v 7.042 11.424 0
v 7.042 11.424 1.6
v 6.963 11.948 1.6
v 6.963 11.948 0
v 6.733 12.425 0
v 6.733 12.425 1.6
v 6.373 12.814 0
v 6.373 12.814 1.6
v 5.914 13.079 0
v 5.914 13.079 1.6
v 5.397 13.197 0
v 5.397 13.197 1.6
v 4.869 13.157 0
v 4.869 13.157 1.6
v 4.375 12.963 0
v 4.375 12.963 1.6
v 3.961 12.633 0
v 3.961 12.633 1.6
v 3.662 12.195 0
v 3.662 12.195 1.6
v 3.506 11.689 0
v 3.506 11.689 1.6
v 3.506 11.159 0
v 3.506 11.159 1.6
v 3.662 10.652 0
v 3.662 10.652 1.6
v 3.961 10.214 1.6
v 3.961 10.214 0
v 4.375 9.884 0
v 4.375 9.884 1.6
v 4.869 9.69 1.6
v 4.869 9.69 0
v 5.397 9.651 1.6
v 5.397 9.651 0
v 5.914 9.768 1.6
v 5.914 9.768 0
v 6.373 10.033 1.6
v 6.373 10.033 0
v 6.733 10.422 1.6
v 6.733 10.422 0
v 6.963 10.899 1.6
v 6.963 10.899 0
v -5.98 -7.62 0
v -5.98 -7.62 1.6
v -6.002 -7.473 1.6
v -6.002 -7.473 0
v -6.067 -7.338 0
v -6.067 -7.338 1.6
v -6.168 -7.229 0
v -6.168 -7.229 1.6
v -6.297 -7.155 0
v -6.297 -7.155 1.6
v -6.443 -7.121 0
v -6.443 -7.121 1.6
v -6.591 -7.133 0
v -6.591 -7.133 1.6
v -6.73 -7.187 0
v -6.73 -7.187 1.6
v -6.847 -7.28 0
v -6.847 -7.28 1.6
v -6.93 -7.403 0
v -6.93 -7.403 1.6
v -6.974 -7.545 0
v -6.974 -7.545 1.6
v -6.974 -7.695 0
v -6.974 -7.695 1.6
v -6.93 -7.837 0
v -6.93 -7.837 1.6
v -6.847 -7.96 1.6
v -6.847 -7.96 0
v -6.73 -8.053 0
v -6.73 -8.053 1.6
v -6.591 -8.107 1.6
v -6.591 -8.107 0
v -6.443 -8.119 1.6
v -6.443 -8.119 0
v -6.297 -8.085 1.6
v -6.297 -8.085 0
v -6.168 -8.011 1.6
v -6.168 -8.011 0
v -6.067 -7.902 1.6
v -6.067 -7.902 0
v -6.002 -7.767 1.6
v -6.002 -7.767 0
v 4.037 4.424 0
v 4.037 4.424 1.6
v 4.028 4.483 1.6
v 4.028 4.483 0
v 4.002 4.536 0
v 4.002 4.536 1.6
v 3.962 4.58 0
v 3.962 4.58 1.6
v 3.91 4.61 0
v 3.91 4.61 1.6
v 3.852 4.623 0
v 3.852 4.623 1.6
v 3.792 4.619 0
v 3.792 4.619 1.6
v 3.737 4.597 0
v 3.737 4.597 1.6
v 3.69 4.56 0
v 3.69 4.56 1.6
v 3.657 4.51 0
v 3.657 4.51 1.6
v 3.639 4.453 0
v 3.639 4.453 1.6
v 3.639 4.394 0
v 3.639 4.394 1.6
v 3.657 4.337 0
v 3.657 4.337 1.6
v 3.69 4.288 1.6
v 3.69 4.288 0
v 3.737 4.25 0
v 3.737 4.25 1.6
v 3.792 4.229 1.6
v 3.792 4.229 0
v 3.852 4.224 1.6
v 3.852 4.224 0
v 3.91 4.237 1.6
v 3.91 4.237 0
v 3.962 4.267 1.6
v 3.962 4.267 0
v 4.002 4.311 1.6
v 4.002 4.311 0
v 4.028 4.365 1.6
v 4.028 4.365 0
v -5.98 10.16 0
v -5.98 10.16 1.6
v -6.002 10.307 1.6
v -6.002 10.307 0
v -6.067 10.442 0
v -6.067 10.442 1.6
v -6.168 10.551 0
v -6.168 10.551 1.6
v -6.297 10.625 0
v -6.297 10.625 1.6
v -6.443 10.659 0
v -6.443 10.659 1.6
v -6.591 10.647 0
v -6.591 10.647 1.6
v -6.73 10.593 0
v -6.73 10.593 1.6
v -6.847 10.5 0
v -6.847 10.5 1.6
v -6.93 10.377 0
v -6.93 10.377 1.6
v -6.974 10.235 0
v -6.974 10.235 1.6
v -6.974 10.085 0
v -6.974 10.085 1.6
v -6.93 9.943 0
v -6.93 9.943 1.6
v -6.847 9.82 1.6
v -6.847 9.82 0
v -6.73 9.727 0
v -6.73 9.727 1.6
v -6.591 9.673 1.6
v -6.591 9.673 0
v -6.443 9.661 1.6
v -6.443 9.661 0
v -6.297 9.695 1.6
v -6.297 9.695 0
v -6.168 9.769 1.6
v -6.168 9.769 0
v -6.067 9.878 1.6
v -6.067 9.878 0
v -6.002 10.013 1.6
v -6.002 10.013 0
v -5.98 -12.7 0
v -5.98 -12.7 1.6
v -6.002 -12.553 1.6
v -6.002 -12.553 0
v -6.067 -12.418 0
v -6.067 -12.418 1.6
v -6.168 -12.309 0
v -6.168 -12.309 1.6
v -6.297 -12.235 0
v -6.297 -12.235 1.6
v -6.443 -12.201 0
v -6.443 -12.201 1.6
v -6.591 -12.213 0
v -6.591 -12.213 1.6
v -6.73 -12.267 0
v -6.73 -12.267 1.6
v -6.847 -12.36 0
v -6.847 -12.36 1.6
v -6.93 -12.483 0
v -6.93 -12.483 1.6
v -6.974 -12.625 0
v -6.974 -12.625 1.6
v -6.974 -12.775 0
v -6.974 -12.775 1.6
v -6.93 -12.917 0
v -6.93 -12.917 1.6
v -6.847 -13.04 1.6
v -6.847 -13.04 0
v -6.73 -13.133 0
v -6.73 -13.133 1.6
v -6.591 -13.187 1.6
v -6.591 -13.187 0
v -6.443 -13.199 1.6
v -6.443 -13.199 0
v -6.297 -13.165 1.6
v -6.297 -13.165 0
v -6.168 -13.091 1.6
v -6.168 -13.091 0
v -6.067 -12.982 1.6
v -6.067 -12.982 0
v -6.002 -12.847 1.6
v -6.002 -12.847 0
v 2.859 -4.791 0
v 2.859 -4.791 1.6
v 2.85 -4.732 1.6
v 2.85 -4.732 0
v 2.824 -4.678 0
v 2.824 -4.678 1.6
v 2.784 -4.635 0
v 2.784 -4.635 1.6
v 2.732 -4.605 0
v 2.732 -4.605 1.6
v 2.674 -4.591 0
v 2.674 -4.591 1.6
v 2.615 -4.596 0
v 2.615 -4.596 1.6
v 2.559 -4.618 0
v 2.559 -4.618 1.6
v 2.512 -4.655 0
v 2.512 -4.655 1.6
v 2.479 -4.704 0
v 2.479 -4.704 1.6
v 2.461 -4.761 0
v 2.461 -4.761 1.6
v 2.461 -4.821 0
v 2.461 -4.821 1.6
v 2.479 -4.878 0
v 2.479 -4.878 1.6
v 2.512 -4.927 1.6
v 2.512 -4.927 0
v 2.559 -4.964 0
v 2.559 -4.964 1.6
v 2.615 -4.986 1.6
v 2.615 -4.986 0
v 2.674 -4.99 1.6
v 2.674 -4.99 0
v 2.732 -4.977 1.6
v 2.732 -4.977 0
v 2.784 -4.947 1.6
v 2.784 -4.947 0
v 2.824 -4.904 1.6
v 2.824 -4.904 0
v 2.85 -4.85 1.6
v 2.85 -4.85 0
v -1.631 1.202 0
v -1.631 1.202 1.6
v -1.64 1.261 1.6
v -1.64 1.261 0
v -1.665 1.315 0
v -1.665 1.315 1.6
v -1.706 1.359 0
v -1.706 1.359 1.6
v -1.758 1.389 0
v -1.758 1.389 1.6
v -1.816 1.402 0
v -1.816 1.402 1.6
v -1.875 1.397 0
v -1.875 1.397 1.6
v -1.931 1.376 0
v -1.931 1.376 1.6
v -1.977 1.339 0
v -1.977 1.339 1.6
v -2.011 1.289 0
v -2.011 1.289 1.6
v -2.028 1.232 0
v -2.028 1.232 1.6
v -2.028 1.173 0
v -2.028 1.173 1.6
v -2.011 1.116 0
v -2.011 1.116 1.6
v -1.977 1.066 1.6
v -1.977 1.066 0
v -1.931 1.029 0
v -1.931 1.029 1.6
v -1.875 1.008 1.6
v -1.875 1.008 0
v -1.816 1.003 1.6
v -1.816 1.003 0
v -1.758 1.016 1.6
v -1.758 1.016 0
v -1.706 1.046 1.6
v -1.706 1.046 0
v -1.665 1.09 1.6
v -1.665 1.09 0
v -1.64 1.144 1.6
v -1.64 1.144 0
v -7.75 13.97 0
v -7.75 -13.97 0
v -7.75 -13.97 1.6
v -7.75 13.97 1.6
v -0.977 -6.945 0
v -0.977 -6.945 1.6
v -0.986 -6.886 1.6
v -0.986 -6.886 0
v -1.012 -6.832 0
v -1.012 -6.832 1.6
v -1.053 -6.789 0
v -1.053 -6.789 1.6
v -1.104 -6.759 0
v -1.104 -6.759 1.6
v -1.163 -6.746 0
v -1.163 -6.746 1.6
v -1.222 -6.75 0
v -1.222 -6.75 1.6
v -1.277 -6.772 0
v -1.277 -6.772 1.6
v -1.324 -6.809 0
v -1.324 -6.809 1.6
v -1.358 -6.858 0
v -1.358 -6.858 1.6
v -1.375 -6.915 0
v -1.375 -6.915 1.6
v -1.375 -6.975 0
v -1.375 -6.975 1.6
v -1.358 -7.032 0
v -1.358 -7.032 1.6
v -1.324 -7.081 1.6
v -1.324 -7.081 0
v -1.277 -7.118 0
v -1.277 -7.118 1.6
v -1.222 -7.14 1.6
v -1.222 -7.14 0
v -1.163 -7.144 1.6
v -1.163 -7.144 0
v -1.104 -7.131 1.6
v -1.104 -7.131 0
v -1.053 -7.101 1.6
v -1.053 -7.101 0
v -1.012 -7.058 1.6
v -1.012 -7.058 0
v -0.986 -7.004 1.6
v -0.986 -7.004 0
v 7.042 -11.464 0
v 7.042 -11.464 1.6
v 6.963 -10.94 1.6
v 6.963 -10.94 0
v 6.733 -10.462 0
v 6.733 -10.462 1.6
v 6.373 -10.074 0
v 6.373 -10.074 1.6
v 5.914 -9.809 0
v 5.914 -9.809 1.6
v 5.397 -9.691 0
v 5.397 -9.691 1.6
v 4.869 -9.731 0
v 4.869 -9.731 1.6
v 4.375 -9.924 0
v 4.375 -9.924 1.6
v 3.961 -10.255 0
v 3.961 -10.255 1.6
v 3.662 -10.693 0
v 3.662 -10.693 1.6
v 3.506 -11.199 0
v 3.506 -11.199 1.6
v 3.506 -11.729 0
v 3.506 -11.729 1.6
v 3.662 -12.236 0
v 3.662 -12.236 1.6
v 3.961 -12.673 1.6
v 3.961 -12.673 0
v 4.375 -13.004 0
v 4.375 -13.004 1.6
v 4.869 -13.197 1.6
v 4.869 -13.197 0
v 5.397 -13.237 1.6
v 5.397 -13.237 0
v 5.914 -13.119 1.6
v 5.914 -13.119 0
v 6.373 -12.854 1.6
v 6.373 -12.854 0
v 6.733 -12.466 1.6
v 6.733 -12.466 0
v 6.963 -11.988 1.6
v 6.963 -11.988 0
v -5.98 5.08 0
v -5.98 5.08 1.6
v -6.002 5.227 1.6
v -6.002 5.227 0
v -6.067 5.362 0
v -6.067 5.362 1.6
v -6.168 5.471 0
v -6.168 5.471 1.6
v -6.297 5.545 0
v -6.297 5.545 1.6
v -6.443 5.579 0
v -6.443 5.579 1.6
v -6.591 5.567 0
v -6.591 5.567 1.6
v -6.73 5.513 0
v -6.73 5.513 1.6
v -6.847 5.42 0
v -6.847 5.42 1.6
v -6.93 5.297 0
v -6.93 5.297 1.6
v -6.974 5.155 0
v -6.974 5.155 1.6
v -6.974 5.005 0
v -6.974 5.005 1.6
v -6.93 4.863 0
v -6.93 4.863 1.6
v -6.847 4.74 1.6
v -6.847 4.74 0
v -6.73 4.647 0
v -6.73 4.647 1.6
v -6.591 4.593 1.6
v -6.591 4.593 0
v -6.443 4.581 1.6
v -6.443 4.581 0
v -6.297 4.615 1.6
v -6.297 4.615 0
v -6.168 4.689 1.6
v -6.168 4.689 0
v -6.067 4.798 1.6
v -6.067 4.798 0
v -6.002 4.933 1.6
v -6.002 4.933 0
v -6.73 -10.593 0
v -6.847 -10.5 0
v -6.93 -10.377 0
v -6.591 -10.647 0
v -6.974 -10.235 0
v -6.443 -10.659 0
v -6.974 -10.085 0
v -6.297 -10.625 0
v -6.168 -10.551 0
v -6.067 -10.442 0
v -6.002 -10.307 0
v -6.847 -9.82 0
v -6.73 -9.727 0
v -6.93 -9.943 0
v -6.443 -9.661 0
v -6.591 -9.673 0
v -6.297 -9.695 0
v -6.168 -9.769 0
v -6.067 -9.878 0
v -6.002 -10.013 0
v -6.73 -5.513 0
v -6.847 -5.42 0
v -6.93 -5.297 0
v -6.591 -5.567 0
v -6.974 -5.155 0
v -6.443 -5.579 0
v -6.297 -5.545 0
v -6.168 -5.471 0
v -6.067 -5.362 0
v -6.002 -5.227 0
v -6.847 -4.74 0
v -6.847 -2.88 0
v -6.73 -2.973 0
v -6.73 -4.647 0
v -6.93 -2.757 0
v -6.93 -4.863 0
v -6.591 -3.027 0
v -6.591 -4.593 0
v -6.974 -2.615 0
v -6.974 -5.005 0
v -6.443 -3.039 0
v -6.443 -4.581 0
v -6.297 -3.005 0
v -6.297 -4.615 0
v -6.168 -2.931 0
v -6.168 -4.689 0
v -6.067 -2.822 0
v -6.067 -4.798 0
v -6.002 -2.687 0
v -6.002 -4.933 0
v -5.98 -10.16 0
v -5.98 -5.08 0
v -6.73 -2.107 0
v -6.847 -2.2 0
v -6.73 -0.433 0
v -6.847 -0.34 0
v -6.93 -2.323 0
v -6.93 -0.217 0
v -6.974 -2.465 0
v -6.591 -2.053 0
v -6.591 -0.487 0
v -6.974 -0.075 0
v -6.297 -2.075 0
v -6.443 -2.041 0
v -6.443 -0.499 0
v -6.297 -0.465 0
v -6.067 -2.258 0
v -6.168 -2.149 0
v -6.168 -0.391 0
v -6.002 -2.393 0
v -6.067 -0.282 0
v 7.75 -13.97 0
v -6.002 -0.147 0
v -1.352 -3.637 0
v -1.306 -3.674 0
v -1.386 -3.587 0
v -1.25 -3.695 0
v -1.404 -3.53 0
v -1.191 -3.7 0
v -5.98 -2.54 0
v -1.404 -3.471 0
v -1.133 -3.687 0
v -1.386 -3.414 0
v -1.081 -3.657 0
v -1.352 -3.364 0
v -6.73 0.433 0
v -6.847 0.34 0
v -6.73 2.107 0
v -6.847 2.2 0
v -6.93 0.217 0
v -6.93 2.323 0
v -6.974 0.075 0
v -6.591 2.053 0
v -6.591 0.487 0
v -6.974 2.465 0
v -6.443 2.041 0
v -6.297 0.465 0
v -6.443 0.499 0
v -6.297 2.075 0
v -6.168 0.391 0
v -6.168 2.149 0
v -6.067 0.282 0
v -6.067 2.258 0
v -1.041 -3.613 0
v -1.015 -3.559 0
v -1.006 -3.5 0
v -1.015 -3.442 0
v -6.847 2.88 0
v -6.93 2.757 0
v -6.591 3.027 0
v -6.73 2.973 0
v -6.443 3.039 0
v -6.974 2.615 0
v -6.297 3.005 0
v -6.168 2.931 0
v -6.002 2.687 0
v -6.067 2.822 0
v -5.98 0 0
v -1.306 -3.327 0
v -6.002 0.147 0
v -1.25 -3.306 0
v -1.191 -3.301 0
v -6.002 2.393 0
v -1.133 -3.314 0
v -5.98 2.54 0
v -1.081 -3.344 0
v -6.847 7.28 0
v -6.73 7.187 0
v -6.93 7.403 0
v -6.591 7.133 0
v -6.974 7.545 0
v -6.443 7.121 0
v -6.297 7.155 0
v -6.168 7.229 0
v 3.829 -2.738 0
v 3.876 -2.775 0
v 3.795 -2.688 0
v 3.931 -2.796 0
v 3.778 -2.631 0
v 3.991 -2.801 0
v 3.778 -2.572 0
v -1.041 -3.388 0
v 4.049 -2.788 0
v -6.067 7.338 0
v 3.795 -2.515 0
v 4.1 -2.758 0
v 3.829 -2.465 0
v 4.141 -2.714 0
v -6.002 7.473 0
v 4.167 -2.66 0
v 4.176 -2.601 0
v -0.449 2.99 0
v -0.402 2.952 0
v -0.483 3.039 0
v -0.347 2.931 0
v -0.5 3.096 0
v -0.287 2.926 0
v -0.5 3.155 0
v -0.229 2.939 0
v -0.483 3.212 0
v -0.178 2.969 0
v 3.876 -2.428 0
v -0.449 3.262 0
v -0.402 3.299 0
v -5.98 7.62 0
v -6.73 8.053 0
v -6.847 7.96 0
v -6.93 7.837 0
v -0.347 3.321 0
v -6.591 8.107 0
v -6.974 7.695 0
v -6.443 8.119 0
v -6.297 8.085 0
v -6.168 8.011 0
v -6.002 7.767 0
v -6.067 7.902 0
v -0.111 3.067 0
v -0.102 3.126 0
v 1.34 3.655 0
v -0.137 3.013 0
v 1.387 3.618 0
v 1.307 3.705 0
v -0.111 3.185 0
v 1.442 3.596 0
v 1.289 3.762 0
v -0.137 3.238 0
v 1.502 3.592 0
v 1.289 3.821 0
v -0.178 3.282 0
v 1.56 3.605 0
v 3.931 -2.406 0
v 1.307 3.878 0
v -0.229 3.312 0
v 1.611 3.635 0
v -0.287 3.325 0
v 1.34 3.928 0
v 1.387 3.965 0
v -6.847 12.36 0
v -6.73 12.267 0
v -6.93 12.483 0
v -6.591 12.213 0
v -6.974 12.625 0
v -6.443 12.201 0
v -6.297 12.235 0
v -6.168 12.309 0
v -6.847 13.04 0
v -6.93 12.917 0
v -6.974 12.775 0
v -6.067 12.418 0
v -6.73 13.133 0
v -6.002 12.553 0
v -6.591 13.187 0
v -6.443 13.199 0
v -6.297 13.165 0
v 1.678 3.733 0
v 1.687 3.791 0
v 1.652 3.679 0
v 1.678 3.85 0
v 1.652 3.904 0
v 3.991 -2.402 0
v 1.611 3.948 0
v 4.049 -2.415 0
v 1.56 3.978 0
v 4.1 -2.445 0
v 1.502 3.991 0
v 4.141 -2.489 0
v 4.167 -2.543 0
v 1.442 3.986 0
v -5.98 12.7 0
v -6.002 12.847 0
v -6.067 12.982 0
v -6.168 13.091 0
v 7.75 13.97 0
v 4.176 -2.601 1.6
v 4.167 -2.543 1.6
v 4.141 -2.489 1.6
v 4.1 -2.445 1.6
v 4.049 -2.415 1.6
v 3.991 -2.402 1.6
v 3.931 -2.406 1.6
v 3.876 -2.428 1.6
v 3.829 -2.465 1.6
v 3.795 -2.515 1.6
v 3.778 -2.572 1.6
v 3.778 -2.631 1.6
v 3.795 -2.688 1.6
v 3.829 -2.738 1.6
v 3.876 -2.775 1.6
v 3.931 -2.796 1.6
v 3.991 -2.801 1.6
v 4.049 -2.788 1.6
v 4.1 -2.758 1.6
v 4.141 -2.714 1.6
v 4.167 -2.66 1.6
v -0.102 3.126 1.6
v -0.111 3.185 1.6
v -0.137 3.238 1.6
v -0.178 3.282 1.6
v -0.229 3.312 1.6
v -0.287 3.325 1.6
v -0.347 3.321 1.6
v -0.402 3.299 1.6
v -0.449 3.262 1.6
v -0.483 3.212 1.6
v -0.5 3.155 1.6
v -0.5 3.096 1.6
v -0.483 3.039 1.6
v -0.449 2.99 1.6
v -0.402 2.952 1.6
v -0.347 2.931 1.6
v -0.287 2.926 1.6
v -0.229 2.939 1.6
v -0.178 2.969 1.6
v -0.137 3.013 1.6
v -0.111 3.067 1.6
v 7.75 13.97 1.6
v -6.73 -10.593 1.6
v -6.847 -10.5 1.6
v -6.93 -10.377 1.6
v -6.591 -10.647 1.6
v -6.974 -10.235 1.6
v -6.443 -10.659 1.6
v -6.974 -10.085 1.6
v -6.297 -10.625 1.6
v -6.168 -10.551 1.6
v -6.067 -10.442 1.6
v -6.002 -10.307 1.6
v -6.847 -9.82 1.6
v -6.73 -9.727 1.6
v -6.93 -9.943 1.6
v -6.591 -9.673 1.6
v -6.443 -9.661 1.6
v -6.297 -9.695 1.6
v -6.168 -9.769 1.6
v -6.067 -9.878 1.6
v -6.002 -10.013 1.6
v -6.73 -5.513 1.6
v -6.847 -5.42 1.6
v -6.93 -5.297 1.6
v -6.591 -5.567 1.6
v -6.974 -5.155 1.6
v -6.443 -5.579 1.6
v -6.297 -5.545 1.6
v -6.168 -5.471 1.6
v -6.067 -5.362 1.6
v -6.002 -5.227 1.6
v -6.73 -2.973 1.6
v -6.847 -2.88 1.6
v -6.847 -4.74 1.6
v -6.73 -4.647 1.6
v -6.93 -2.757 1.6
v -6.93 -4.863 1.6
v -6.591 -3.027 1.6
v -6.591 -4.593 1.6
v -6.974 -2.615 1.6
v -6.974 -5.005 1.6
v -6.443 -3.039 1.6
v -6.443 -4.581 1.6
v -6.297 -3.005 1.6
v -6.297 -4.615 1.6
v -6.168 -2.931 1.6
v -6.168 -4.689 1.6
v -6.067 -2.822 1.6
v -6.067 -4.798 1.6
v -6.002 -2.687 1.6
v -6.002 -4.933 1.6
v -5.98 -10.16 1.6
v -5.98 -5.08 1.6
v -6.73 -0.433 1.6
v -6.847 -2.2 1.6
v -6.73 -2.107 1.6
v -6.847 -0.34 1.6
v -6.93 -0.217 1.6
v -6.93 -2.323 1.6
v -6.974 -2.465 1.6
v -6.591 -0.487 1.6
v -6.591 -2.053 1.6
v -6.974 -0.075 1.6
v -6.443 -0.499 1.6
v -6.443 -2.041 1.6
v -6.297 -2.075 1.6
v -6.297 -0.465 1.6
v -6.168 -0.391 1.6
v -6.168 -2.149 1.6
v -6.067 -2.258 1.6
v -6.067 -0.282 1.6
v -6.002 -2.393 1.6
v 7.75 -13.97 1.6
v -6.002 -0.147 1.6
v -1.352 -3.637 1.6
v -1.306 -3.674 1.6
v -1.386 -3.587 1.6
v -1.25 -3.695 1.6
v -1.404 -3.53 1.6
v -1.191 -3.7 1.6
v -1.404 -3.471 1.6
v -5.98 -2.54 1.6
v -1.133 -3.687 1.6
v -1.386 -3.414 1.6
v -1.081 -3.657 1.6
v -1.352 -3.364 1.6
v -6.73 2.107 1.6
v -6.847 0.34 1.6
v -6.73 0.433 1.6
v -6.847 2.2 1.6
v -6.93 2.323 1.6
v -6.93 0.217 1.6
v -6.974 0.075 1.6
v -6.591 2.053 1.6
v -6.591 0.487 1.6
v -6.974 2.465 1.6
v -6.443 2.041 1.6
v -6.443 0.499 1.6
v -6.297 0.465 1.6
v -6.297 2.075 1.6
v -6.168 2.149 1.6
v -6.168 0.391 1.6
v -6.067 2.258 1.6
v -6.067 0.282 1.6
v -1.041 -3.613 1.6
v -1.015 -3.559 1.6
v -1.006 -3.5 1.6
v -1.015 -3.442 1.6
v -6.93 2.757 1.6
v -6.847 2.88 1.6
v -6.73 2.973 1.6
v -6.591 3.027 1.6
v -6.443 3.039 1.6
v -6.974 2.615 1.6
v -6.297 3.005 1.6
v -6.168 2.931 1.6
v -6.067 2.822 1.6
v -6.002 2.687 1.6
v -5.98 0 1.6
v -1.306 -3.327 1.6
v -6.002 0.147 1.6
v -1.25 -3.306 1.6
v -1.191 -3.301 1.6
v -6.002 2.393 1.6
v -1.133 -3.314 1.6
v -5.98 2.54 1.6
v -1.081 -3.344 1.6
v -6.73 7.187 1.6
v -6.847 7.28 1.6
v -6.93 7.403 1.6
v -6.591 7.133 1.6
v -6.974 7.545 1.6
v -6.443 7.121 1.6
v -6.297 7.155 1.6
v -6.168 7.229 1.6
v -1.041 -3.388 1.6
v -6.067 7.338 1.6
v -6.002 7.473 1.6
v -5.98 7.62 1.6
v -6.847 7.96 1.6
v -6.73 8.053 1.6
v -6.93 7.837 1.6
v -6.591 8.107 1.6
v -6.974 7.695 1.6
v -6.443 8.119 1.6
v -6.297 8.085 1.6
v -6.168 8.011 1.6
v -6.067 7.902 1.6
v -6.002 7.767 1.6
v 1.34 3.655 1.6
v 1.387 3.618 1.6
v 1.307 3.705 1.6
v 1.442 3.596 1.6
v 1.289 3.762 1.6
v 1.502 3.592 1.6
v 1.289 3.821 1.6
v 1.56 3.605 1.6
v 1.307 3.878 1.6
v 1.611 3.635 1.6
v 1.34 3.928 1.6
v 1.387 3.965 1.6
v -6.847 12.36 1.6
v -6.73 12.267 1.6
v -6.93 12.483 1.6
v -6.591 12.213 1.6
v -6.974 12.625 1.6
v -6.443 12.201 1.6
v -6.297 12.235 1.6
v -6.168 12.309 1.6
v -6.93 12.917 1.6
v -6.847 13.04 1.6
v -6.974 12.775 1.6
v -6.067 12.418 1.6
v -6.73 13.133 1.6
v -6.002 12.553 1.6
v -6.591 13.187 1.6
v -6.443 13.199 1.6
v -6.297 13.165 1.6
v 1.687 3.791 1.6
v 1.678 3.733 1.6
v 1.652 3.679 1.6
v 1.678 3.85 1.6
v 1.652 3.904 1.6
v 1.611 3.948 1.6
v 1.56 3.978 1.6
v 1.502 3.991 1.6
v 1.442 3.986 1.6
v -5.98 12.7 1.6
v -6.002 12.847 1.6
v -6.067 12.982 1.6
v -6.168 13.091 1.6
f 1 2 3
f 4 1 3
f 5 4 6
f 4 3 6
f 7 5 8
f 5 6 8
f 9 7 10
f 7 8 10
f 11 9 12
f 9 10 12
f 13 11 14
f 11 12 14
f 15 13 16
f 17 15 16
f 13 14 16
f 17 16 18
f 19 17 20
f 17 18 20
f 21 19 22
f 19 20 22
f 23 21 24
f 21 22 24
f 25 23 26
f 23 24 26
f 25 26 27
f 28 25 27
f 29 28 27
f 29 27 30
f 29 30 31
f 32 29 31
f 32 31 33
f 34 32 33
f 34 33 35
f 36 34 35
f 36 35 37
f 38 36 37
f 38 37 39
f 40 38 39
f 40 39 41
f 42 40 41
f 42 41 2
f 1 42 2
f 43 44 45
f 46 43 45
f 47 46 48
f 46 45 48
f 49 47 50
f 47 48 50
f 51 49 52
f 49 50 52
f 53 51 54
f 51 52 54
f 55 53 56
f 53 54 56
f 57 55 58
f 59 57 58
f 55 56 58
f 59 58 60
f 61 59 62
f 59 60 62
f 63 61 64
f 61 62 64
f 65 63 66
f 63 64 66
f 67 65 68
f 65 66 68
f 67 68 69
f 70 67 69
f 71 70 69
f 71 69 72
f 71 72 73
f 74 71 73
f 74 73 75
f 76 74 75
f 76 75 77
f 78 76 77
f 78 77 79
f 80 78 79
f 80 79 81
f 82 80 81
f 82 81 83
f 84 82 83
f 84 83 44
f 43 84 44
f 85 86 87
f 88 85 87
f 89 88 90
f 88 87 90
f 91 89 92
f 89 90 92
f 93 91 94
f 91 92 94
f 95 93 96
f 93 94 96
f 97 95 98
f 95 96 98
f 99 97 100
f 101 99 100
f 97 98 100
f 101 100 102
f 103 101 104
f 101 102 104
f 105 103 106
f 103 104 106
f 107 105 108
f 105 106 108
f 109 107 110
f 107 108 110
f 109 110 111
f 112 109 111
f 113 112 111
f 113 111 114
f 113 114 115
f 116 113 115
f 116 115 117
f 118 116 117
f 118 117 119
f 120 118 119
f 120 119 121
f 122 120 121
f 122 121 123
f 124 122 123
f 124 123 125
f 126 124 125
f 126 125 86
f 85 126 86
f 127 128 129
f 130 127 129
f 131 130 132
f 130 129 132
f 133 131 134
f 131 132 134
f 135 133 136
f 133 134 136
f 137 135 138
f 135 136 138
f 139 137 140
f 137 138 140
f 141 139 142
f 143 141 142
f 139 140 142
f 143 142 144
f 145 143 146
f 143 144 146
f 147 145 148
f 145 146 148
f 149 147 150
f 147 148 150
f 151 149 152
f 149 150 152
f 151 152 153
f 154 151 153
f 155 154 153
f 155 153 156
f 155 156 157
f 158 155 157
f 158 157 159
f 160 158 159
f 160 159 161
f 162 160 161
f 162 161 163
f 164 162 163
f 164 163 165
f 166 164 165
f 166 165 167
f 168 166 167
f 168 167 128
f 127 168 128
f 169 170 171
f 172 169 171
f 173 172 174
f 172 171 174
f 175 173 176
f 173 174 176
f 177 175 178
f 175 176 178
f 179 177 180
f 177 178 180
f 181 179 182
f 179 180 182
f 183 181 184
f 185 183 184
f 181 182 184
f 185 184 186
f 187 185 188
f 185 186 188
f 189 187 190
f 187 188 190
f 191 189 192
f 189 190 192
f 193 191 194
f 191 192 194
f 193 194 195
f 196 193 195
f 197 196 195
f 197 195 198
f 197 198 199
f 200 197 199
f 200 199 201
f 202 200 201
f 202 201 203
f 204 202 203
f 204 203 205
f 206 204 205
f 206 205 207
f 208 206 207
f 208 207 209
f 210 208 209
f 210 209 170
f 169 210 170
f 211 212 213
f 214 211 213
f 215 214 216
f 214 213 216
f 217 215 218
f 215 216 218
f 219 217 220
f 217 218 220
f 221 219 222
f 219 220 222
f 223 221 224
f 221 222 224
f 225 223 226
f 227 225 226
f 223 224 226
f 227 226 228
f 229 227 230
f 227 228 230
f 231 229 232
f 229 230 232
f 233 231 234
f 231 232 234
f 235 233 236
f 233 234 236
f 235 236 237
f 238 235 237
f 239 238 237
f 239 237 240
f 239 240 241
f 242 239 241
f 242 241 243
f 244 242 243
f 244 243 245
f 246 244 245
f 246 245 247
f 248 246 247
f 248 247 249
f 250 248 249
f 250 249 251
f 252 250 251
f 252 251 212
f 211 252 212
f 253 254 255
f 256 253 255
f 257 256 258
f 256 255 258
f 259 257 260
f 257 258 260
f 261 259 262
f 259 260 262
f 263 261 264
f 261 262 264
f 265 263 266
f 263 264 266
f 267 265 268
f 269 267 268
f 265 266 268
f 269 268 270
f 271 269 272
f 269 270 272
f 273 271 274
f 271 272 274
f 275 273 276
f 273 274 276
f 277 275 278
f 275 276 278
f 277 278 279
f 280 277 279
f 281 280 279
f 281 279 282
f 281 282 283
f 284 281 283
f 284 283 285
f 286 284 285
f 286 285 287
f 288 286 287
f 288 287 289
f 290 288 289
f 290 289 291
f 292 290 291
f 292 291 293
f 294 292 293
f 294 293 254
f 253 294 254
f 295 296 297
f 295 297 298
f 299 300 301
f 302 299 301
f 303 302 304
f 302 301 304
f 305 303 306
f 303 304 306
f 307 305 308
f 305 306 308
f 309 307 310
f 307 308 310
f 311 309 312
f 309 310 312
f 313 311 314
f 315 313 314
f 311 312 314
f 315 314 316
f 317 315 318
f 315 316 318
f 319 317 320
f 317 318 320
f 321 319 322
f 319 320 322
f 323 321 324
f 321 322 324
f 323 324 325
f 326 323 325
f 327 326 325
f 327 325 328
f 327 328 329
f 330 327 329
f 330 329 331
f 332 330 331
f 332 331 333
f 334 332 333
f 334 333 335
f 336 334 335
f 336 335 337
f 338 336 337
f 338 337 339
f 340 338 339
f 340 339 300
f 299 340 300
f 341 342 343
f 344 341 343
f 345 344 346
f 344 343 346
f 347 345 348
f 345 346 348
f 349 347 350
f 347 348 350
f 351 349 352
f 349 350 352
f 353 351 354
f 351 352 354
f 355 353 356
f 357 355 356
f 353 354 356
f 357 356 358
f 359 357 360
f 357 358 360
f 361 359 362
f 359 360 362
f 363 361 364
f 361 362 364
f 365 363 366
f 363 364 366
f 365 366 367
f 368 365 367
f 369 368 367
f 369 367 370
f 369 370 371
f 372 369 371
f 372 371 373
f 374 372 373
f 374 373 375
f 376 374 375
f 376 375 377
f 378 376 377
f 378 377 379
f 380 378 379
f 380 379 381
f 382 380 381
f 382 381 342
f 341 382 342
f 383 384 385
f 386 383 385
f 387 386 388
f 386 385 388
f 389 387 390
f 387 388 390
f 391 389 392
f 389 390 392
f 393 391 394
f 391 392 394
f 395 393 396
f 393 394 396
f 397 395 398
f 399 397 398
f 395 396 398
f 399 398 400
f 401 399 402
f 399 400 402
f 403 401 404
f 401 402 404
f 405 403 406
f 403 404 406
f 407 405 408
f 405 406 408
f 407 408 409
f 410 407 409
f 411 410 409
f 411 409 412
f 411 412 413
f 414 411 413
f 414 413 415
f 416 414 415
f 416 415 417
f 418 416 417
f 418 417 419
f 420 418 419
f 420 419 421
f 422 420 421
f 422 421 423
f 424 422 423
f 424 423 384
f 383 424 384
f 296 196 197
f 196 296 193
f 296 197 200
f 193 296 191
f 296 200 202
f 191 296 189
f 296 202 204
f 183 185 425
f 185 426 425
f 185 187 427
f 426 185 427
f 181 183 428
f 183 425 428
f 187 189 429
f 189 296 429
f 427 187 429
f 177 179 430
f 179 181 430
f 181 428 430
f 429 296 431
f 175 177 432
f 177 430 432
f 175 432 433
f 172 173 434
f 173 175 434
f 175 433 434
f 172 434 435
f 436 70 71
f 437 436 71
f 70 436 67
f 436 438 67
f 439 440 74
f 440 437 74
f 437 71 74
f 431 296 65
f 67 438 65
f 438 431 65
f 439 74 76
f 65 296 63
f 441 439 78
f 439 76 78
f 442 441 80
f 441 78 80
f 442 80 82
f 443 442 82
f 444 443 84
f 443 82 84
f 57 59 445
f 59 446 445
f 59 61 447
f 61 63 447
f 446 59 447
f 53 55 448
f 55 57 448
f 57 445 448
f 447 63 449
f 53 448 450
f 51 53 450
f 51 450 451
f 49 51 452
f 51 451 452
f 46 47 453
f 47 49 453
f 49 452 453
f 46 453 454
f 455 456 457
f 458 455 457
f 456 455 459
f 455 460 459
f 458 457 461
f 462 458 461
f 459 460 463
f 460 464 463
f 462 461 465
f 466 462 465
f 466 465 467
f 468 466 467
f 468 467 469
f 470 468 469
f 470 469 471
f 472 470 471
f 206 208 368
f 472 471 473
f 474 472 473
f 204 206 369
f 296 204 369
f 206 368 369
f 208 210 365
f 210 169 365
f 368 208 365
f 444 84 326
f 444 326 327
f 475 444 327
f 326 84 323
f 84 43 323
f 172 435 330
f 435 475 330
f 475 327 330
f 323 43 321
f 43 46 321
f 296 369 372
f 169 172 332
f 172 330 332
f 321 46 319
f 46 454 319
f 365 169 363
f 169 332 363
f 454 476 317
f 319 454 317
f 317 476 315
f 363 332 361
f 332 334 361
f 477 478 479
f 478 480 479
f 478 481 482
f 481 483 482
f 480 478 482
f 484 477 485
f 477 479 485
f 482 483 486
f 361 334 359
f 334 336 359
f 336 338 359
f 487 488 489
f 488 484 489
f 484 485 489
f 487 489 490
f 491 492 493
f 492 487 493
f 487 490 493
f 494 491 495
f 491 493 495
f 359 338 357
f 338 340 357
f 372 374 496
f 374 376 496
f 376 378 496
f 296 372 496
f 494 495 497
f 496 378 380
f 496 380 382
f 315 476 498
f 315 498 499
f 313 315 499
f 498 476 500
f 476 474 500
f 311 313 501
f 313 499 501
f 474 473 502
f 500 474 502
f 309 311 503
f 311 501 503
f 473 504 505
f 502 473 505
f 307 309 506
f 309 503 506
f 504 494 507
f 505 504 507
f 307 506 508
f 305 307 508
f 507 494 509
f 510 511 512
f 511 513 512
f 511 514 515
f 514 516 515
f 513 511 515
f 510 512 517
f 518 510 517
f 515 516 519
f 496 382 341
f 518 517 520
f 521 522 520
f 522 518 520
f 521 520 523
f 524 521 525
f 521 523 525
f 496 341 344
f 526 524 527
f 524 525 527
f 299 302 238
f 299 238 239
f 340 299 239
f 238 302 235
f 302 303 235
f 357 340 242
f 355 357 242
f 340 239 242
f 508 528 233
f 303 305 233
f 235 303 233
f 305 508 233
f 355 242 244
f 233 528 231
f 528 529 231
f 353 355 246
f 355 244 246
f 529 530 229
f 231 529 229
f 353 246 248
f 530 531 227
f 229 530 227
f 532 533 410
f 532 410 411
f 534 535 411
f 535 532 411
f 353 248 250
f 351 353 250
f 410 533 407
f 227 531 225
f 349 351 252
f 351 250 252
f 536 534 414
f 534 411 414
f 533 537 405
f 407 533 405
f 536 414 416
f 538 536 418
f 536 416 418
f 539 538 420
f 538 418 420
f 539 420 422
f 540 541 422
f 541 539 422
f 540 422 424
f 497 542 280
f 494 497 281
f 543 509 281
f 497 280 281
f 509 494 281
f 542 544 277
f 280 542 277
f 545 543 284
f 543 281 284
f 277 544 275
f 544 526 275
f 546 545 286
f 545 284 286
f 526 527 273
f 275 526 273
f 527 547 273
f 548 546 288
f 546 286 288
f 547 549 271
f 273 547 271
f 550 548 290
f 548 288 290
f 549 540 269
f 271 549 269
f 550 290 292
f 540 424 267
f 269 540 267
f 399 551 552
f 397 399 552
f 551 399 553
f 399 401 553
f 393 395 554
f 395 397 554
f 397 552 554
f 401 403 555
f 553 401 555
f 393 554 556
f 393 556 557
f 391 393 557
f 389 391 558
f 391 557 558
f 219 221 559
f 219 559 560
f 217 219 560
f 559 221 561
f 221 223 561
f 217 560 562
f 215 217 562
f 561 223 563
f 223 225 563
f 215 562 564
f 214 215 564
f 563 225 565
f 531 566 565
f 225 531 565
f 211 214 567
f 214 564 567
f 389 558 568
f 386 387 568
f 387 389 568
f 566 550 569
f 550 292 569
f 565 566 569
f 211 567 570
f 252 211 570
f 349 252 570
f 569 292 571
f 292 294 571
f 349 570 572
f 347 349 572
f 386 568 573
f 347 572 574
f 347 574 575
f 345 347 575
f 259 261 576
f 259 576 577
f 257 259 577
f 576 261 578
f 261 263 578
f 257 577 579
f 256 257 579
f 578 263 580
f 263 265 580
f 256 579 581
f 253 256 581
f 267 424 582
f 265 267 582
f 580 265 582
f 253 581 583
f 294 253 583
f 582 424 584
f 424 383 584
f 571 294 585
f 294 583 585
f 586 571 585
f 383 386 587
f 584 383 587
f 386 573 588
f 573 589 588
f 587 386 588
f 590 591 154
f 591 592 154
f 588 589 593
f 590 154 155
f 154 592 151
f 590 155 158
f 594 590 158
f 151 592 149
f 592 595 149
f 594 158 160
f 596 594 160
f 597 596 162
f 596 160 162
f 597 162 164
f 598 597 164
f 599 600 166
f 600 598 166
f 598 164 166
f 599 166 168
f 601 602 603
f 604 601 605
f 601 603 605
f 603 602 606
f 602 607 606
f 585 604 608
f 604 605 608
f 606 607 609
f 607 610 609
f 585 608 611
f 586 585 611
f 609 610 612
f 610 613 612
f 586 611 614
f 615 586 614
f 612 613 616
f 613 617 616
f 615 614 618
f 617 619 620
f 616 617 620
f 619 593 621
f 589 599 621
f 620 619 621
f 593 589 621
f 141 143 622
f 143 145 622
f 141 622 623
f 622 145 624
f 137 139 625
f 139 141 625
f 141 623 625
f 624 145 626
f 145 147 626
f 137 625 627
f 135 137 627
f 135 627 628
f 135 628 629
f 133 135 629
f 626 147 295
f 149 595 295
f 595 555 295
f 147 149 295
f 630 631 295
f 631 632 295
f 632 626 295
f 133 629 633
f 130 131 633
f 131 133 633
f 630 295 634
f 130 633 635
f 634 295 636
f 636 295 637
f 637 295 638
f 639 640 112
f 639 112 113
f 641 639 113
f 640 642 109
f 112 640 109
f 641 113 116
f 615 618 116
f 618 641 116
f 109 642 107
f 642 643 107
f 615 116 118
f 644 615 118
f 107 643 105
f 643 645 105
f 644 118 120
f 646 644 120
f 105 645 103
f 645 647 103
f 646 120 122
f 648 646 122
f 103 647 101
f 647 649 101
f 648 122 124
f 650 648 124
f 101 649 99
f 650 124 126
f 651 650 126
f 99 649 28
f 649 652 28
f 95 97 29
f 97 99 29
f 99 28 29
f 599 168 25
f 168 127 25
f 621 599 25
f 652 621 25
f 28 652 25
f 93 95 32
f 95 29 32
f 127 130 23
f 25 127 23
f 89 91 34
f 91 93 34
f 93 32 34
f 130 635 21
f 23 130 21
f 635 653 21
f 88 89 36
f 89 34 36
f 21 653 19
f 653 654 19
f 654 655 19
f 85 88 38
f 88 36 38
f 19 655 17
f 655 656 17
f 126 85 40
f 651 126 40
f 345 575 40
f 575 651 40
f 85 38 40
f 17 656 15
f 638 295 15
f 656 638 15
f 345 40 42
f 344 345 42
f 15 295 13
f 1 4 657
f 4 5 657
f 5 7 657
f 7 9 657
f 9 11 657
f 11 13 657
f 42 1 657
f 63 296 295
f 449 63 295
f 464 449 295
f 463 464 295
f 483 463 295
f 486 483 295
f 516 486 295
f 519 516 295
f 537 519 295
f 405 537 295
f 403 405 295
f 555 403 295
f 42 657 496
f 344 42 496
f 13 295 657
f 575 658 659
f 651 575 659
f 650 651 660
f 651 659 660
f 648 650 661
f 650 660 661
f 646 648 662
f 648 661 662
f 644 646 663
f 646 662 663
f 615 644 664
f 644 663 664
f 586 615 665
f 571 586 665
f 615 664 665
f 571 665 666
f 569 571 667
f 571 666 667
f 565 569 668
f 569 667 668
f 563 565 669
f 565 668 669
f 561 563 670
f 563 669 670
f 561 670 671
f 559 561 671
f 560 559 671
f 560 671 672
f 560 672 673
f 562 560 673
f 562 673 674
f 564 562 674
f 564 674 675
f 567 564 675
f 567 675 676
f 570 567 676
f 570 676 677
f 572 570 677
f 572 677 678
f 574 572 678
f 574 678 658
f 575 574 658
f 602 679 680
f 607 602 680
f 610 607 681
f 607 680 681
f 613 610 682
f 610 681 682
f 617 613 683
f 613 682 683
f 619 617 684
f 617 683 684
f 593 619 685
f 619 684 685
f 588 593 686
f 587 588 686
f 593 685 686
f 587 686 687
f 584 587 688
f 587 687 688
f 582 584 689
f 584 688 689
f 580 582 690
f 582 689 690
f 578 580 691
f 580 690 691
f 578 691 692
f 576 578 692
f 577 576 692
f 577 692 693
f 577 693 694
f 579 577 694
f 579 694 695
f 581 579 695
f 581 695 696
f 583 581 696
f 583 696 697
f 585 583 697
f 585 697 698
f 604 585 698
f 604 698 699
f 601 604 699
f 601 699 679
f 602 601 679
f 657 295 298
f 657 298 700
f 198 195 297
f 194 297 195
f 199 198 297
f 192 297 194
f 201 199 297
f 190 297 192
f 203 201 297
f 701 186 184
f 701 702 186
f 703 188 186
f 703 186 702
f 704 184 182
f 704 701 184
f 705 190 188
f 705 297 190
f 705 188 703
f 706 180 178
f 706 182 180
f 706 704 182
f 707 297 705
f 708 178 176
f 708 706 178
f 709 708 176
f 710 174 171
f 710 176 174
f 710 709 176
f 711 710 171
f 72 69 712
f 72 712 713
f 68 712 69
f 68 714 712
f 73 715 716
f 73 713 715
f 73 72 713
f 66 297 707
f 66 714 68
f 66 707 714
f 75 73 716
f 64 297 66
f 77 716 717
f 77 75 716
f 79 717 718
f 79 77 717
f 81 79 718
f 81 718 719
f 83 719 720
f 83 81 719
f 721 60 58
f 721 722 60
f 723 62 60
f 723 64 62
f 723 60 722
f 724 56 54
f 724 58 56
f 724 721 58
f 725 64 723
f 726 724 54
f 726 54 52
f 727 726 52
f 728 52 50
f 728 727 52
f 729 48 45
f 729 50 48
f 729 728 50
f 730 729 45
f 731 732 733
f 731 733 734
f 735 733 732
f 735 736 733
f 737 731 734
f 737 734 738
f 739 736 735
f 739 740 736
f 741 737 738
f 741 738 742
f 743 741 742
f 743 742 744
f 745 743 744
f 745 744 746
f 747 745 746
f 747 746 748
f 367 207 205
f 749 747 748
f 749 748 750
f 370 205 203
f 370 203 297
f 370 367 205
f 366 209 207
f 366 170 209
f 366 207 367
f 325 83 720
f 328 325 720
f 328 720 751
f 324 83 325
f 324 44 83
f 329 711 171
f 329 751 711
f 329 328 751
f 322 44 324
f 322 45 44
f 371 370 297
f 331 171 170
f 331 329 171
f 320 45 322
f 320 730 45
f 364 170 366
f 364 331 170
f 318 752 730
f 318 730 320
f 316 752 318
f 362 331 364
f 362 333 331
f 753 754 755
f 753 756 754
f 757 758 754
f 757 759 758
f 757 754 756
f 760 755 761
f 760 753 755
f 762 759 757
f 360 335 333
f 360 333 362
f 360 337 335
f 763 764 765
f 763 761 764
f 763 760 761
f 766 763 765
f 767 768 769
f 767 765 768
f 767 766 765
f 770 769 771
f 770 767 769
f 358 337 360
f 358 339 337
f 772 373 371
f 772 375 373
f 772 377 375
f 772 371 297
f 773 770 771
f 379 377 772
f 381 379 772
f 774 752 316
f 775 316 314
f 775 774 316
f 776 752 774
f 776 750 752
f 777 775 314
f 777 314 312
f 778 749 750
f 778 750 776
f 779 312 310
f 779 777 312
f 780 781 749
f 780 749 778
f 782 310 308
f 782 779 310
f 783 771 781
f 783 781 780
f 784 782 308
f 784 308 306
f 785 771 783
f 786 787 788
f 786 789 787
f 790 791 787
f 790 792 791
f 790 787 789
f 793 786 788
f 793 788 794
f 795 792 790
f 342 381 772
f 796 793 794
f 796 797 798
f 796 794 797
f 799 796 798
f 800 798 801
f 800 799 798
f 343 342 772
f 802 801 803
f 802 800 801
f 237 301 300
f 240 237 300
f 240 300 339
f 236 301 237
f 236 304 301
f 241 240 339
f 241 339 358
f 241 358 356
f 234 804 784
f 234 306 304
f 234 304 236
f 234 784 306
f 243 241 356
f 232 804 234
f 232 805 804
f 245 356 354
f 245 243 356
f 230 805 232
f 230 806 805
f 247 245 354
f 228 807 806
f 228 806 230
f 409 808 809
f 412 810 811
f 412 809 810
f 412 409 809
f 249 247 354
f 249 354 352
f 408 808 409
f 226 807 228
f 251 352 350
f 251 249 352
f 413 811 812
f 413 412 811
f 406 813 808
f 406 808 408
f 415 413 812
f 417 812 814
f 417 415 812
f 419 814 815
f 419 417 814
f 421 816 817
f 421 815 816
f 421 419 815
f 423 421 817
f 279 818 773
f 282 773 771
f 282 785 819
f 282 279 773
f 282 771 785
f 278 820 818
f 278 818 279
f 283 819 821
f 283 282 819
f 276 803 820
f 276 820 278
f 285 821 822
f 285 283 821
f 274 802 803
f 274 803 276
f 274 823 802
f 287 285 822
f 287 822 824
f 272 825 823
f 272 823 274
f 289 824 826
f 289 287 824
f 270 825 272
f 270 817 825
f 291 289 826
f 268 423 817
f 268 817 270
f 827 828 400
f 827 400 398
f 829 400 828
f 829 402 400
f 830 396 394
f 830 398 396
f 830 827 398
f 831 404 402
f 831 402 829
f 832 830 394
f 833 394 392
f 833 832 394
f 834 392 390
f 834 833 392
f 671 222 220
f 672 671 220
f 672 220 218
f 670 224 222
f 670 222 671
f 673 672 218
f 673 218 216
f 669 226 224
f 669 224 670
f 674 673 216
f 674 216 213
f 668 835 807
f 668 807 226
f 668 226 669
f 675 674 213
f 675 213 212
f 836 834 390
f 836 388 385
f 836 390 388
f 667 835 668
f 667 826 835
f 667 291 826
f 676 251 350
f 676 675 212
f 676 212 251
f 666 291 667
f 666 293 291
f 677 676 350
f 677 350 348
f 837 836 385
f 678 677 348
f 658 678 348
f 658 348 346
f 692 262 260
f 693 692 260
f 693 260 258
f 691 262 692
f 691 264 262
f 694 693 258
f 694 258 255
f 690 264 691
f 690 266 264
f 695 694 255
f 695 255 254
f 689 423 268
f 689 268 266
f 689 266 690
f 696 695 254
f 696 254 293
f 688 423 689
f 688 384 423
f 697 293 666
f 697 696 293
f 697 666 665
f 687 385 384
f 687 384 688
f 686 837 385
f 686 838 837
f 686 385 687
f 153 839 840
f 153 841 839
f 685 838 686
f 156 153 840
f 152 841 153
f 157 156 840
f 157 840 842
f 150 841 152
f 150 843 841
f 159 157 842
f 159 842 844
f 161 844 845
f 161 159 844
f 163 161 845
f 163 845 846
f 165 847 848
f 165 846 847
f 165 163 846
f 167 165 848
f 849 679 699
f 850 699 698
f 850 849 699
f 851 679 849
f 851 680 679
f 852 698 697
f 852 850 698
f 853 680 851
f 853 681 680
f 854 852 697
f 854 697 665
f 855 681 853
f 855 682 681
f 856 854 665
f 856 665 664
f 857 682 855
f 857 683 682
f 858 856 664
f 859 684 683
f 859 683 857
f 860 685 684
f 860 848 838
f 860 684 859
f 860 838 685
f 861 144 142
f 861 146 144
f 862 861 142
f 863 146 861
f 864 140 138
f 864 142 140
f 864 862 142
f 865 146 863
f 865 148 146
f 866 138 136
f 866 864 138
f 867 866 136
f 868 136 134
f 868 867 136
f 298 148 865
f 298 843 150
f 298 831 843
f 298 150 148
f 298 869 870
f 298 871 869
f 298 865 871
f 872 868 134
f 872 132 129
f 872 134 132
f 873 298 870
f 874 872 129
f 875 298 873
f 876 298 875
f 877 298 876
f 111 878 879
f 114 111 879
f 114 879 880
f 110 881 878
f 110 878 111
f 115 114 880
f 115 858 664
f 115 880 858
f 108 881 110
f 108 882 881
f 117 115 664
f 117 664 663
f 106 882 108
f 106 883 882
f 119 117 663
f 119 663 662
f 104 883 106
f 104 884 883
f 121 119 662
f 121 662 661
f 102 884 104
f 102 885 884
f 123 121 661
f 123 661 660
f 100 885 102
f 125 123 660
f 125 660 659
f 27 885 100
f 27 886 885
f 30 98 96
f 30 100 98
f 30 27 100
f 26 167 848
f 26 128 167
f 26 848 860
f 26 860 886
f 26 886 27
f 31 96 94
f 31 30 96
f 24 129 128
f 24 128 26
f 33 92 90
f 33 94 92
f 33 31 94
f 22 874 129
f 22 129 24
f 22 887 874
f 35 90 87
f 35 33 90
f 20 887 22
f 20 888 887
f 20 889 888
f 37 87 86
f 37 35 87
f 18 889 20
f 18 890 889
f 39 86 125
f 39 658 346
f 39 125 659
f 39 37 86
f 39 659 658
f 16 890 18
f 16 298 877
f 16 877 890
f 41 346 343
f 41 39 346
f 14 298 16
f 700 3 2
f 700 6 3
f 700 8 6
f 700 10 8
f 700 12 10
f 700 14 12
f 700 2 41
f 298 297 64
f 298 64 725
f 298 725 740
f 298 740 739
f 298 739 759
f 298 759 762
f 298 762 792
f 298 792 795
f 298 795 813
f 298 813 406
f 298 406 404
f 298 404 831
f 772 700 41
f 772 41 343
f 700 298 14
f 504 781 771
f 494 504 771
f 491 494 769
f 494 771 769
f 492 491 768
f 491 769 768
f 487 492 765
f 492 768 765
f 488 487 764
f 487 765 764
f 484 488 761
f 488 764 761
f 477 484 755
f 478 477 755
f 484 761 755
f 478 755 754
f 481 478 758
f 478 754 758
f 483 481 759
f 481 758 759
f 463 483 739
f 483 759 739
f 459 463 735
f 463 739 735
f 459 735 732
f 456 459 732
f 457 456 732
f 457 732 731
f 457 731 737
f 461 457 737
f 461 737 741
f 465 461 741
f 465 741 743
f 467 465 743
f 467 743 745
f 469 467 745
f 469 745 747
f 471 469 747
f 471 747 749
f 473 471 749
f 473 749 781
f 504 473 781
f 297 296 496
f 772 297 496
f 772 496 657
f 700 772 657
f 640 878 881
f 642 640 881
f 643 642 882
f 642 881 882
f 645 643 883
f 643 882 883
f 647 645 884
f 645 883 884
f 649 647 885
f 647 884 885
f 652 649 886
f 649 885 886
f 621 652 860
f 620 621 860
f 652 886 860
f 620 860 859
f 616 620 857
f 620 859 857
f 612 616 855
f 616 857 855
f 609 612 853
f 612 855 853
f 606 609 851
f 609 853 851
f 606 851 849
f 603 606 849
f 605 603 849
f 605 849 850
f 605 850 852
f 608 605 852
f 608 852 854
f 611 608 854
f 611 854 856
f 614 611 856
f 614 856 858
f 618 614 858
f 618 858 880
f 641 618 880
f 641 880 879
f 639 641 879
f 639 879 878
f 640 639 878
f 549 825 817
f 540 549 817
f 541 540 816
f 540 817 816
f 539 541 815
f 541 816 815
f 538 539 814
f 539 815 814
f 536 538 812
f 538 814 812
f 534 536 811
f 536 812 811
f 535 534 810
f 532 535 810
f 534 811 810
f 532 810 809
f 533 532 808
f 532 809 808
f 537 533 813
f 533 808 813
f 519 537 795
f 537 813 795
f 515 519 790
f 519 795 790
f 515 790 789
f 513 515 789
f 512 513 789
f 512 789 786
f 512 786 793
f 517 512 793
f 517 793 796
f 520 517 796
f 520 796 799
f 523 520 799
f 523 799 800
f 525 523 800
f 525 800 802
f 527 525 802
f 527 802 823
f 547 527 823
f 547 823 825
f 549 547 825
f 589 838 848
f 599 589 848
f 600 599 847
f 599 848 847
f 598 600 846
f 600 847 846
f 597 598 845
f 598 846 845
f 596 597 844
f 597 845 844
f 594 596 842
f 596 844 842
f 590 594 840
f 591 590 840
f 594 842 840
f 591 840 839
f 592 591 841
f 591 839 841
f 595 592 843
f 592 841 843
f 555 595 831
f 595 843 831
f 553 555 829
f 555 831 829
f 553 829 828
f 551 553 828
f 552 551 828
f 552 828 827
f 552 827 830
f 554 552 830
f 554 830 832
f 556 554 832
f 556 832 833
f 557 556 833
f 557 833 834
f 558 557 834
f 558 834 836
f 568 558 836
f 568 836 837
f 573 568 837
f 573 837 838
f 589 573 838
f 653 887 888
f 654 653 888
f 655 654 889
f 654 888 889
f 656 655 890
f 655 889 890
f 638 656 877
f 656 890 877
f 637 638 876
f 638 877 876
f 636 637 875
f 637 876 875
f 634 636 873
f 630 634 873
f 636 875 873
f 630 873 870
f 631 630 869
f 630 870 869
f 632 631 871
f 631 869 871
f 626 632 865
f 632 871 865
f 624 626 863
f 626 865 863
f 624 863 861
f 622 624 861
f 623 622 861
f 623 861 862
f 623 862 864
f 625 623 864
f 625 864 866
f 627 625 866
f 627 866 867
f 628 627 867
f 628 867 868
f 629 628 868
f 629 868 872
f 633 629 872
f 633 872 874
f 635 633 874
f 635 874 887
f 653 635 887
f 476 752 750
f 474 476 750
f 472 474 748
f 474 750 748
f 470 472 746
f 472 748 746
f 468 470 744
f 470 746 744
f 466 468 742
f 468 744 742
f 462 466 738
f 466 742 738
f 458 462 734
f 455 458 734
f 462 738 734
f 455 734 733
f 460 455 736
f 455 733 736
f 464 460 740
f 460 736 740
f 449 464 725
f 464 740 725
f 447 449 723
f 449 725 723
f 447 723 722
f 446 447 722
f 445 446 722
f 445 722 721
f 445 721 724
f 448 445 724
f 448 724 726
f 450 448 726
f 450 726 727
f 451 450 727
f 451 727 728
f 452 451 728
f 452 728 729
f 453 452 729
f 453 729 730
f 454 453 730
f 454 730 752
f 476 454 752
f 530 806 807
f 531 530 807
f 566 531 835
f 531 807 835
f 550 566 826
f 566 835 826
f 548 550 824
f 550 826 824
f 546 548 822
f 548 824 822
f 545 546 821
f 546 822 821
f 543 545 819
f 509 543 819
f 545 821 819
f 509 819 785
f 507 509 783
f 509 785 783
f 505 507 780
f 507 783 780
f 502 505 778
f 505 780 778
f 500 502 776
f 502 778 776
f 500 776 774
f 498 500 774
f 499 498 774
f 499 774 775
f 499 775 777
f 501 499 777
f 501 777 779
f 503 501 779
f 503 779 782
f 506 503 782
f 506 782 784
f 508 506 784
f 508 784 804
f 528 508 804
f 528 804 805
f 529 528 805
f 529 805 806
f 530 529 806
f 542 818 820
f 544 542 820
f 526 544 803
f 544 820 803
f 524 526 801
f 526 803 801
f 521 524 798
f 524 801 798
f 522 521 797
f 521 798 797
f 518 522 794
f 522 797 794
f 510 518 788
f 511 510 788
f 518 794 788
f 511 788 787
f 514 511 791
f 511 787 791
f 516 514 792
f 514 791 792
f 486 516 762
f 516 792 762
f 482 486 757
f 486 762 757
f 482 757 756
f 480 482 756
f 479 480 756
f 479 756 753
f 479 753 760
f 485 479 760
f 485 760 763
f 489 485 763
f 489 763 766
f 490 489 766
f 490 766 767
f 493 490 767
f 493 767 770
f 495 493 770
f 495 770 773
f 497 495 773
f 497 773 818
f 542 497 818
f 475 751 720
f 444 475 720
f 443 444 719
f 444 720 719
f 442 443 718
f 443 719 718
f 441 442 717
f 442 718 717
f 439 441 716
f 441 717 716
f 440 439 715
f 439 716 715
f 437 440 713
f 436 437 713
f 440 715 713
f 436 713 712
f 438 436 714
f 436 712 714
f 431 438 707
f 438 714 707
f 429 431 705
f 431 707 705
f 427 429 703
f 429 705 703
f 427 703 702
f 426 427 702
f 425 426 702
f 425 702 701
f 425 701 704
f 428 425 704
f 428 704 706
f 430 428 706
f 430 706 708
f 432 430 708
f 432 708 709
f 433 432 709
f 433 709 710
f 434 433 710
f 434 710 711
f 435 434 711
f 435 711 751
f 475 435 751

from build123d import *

# Parameters (mm, degrees)
SKETCH1_W           = 15.5
SKETCH1_H           = 27.94
BOSS_EXTRUDE1_DEPTH = 1.6
SKETCH2_R           = 0.5
SKETCH2_R_2         = 1.778
CUT_EXTRUDE1_DEPTH  = 2
SKETCH3_R           = 0.2
CUT_EXTRUDE2_DEPTH  = 10


with BuildPart() as part:
    # Sketch1 → Boss-Extrude1 (new body)
    with BuildSketch(Plane.XY):
        Rectangle(SKETCH1_W, SKETCH1_H)
    extrude(amount=BOSS_EXTRUDE1_DEPTH)

    # Sketch2 → Cut-Extrude1 (cut)
    with BuildSketch(Plane.XY.offset(1.6)):
        with Locations((-6.48, -12.7)):
            Circle(SKETCH2_R)
        with Locations((-6.48, -10.16)):
            Circle(SKETCH2_R)
        with Locations((-6.48, -7.62)):
            Circle(SKETCH2_R)
        with Locations((-6.48, -5.08)):
            Circle(SKETCH2_R)
        with Locations((-6.48, -2.54)):
            Circle(SKETCH2_R)
        with Locations((-6.48, 0)):
            Circle(SKETCH2_R)
        with Locations((-6.48, 2.54)):
            Circle(SKETCH2_R)
        with Locations((-6.48, 5.08)):
            Circle(SKETCH2_R)
        with Locations((-6.48, 7.62)):
            Circle(SKETCH2_R)
        with Locations((-6.48, 10.16)):
            Circle(SKETCH2_R)
        with Locations((-6.48, 12.7)):
            Circle(SKETCH2_R)
        with Locations((5.26414257, 11.423545933)):
            Circle(SKETCH2_R_2)
        with Locations((5.26414257, -11.464062499)):
            Circle(SKETCH2_R_2)
    extrude(amount=-CUT_EXTRUDE1_DEPTH, mode=Mode.SUBTRACT)

    # Sketch3 → Cut-Extrude2 (cut)
    with BuildSketch(Plane.XY.offset(1.6)):
        with Locations((-1.830670849, 1.202487627)):
            Circle(SKETCH3_R)
        with Locations((-0.302406534, 3.125566843)):
            Circle(SKETCH3_R)
        with Locations((1.486755487, 3.791476374)):
            Circle(SKETCH3_R)
        with Locations((3.836977644, 4.423555572)):
            Circle(SKETCH3_R)
        with Locations((3.975659184, -2.601471813)):
            Circle(SKETCH3_R)
        with Locations((2.659050244, -4.790940134)):
            Circle(SKETCH3_R)
        with Locations((-1.177453811, -6.944947611)):
            Circle(SKETCH3_R)
        with Locations((-1.205838194, -3.50049205)):
            Circle(SKETCH3_R)
    extrude(amount=-CUT_EXTRUDE2_DEPTH, mode=Mode.SUBTRACT)


solid = part.part
